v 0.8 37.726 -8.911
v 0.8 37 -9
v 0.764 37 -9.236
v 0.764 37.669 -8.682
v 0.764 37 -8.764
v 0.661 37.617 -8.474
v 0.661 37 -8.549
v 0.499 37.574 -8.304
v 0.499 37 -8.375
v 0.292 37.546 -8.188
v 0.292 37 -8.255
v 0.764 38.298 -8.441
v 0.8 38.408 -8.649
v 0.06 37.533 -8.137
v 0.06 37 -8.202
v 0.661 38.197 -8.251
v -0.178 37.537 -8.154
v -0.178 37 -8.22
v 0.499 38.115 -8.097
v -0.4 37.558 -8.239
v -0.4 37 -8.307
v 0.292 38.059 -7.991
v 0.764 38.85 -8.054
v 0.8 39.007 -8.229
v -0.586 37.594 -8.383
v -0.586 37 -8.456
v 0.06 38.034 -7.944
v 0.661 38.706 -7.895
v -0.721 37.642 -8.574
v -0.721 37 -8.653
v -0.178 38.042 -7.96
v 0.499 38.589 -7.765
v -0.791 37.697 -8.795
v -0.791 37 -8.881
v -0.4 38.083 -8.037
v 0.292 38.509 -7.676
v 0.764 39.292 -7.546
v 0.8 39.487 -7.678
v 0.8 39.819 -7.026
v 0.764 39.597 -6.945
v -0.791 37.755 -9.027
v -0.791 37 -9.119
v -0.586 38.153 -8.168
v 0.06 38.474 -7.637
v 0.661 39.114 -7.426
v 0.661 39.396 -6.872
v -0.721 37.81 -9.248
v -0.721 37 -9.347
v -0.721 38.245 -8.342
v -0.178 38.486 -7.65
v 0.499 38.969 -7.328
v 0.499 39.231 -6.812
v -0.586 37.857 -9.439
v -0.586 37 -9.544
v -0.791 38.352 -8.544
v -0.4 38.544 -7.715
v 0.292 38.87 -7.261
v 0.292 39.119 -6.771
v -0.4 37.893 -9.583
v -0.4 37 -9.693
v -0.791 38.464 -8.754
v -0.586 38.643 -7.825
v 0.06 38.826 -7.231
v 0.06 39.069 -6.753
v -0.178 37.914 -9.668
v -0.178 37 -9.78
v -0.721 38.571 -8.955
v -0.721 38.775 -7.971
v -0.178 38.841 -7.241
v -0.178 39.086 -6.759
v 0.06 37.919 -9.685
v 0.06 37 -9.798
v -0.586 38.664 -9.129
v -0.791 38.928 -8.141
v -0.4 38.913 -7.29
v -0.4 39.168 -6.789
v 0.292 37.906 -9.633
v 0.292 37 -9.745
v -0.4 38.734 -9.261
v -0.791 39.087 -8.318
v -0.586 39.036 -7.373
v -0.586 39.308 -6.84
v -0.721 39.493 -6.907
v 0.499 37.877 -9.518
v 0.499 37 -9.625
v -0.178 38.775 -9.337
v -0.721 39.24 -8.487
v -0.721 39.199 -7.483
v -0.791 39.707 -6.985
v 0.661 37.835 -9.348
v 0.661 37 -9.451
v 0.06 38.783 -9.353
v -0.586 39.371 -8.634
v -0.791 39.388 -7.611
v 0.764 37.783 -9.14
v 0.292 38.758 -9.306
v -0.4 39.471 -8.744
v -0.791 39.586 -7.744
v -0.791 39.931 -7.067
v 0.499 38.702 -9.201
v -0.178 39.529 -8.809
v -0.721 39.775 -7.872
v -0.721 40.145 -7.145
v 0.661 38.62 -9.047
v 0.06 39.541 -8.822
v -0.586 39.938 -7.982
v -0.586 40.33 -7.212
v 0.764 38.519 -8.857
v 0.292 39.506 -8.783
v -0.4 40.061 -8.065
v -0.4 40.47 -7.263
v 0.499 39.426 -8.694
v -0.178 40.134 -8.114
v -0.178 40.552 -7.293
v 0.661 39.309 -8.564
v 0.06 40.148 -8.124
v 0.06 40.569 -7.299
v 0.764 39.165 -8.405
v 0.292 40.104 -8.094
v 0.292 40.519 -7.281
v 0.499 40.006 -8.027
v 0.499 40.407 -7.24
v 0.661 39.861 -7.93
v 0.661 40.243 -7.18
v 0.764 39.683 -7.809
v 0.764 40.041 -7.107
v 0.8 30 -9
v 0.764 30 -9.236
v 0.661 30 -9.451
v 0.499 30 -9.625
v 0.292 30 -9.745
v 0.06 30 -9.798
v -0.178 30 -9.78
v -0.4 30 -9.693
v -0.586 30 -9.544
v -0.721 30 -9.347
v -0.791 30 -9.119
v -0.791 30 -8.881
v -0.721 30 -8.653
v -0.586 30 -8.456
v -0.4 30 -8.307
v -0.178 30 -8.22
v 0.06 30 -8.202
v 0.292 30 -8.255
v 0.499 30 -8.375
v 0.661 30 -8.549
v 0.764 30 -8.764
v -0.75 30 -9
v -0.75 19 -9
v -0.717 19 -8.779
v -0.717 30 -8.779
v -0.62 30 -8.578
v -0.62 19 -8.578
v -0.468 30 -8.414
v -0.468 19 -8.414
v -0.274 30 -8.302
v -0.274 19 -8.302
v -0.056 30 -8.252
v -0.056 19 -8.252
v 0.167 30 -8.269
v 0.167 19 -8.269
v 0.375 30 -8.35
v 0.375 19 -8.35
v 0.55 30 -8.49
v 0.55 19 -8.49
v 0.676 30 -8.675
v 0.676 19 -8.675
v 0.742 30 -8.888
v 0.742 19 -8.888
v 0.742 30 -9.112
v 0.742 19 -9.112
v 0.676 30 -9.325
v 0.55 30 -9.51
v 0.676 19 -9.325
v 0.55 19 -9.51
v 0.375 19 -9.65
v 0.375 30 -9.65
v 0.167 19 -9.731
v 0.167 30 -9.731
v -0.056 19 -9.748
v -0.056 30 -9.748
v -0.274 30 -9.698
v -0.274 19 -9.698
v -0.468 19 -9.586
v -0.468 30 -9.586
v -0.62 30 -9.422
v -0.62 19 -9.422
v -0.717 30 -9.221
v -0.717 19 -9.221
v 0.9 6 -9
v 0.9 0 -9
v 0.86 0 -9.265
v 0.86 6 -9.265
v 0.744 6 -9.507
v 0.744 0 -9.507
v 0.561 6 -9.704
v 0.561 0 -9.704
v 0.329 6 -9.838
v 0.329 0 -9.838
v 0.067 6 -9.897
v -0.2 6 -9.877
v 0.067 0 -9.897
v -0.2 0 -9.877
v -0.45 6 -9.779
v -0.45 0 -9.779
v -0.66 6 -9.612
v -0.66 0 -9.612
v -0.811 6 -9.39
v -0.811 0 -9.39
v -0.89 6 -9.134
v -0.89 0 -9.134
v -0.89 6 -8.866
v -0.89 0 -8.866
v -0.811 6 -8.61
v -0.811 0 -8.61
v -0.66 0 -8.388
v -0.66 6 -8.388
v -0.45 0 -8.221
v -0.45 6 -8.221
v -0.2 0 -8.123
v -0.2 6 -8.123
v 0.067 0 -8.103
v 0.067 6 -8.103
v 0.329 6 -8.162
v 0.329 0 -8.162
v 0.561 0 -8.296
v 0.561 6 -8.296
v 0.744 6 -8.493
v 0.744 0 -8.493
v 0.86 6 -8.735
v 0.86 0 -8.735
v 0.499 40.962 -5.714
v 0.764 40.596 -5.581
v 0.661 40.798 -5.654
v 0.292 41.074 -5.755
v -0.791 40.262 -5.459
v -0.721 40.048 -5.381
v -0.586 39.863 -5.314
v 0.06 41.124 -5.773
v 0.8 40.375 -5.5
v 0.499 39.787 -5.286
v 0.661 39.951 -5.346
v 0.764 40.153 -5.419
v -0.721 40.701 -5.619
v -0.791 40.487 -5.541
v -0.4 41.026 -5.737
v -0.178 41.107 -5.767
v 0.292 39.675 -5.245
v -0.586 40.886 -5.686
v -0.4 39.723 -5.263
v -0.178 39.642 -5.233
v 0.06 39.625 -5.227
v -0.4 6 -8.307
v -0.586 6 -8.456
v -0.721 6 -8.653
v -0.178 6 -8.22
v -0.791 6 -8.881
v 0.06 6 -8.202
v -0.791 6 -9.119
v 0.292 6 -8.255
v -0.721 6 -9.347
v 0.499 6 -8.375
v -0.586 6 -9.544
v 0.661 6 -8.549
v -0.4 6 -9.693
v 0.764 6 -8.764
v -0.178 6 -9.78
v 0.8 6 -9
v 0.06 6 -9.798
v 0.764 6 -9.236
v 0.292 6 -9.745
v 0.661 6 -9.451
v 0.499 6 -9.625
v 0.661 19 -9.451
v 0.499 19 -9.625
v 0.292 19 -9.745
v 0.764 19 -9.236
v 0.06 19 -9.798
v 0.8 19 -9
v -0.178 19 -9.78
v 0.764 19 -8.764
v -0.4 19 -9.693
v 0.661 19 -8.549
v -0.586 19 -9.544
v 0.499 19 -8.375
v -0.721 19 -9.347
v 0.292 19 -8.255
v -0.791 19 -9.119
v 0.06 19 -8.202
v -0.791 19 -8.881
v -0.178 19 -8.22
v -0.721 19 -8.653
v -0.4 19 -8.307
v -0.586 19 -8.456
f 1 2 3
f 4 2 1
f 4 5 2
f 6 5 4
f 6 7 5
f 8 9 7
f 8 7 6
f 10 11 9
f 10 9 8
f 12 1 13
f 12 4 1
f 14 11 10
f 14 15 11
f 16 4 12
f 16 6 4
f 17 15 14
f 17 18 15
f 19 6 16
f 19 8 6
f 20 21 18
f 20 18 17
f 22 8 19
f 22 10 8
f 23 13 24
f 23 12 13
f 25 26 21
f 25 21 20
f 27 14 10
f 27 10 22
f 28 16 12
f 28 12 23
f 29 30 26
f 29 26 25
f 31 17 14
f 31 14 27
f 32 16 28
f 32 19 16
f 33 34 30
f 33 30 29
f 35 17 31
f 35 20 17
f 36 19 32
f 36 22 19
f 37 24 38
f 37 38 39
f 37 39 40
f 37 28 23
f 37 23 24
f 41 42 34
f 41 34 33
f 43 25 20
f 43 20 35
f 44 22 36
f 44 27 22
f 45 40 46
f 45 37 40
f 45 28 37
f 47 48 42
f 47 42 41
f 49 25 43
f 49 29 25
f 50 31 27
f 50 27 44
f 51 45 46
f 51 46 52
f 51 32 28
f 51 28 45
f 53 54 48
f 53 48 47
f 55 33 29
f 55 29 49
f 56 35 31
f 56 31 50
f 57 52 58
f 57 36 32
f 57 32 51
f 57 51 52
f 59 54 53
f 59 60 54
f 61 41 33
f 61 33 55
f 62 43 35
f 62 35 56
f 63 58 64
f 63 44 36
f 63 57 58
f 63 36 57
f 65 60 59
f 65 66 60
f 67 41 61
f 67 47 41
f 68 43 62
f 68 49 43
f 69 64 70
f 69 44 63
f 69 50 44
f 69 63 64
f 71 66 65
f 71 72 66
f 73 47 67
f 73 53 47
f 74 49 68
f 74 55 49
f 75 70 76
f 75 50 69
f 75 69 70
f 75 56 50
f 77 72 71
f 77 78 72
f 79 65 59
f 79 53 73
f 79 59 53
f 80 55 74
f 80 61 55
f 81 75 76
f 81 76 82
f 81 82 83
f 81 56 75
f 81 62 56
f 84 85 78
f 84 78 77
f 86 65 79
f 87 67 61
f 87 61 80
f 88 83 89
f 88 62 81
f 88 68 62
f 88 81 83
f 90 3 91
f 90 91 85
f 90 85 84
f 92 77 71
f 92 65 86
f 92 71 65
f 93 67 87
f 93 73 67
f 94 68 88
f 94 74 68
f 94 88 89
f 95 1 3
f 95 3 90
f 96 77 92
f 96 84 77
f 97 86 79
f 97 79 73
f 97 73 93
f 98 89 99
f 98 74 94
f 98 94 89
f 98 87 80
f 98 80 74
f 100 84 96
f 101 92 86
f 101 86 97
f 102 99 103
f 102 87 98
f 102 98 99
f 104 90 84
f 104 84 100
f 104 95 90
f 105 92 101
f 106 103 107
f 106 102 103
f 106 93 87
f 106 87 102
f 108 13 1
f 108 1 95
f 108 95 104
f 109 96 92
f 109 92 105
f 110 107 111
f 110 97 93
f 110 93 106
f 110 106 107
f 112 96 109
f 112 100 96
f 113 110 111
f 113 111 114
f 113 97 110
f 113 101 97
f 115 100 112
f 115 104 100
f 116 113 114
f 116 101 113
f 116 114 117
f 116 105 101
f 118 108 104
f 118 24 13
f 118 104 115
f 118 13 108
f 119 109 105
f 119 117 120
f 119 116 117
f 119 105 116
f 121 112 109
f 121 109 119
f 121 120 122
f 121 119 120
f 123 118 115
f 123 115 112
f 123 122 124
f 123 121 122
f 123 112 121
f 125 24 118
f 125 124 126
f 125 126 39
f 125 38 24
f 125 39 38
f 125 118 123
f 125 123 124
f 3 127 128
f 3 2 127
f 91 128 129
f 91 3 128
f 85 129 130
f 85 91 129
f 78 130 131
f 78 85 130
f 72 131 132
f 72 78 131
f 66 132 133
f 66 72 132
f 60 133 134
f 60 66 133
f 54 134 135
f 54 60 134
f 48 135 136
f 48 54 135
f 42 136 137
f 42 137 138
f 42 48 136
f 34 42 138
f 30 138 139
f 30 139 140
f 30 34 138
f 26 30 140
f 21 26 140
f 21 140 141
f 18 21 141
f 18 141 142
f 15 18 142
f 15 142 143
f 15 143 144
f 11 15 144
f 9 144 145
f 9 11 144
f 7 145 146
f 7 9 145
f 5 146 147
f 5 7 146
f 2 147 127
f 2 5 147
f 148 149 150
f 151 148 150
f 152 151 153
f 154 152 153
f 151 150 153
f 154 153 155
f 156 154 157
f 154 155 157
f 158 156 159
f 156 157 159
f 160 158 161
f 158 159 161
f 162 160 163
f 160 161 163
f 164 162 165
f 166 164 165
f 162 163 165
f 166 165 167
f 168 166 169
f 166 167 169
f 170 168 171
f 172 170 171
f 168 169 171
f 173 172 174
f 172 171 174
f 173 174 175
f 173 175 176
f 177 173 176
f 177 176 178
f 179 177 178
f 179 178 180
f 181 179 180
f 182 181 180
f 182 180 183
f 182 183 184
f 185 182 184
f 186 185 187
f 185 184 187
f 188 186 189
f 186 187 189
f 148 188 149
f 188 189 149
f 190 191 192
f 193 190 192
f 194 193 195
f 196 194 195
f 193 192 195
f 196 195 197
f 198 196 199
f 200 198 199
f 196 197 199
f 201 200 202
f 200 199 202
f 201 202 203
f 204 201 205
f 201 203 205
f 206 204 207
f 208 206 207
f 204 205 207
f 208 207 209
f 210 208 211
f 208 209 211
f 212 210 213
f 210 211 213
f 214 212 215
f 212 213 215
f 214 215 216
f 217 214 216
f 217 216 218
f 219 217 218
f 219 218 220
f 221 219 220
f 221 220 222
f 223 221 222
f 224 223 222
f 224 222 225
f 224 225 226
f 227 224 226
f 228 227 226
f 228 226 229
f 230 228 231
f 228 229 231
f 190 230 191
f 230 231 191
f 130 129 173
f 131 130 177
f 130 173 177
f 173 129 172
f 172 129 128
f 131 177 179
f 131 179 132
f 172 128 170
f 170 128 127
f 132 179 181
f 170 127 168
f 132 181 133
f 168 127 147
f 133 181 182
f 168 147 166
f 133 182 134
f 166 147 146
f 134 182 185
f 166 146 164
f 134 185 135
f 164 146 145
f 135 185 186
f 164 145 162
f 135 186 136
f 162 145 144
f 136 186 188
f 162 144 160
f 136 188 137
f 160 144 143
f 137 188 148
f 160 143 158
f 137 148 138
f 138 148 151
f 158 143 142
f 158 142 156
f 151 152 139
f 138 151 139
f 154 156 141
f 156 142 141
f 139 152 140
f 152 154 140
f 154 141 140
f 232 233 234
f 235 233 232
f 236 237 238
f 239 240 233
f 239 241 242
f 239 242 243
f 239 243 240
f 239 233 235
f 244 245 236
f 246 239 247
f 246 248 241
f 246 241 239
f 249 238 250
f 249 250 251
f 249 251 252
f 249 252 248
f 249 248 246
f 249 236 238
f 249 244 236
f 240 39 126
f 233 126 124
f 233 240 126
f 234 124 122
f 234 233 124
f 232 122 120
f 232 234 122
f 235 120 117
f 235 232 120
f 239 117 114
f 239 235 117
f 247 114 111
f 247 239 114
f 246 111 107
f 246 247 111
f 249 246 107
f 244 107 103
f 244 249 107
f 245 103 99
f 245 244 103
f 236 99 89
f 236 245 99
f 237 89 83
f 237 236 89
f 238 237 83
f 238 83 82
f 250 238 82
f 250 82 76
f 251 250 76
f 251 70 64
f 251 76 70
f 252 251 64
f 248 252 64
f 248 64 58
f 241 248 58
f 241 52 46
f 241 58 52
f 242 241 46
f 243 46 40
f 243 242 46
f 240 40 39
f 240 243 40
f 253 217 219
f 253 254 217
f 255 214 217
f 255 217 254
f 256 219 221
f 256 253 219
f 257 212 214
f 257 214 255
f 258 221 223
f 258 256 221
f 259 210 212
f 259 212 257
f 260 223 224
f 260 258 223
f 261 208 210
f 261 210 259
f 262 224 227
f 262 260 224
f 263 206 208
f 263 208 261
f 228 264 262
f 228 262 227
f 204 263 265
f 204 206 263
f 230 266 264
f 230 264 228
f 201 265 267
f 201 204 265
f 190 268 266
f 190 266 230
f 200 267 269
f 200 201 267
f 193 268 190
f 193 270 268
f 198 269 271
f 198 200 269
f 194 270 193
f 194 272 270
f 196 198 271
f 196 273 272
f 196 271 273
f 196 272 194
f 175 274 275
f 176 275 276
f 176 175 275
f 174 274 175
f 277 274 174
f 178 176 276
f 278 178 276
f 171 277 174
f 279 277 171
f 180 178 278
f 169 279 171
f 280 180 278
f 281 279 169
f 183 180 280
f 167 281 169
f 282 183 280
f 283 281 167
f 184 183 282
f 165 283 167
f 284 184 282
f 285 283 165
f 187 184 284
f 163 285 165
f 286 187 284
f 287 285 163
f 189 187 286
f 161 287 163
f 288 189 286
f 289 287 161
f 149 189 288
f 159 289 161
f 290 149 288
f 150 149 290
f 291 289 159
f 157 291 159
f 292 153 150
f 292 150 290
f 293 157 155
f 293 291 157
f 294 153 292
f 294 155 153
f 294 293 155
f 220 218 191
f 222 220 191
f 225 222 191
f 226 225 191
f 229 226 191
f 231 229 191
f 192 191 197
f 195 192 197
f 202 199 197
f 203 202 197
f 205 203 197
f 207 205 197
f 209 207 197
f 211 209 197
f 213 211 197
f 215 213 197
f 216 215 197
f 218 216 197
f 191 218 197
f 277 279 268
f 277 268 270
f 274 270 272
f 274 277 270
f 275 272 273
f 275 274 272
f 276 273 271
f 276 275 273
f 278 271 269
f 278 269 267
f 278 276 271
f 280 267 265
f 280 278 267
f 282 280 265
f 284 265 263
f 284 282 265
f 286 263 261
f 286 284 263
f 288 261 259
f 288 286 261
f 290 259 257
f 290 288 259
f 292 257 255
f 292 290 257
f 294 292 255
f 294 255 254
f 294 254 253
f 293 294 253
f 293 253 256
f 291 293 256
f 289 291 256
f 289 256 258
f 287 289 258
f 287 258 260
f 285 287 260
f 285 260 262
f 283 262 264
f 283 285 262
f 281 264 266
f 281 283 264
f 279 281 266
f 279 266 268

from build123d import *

# Parameters (mm, degrees)
SKETCH2_R         = 0.8
SKETCH4_R         = 0.9
EXTRUDE1_DEPTH    = 6
SKETCH5_OUTSIDE_W = 12.086
SKETCH5_OUTSIDE_H = 14.96
SKETCH5_OUTSIDE_R = 0.75
EXTRUDE3_DEPTH    = 11


with BuildPart() as part:
    # Sweep1: sweep along a path in Sketch1
    with BuildLine(Plane(origin=(0, 0, 0), x_dir=(0, 0, -1), z_dir=(1, 0, 0))) as sweep1_path:
        Line((9, 0), (9, 37))
        ThreePointArc((9, 37), (8.457456133, 38.720729309), (7.02606043, 39.819077862))
        Line((7.02606043, 39.819077862), (5.5, 40.374518435))
    # Sketch2 → Sweep1 (sweep)
    with BuildSketch(Plane(origin=(0, 0, 0), x_dir=(1, 0, 0), z_dir=(0, 1, 0))):
        with Locations((0, 9)):
            Circle(SKETCH2_R)
    sweep(path=sweep1_path.line)

    # Sketch4 → Extrude1 (add)
    with BuildSketch(Plane(origin=(0, 0, 0), x_dir=(1, 0, 0), z_dir=(0, 1, 0))):
        with Locations((0, 9)):
            Circle(SKETCH4_R)
    extrude(amount=EXTRUDE1_DEPTH)

    # Sketch5 outside → Extrude3 (cut)
    with BuildSketch(Plane(origin=(0, 19, 0), x_dir=(-1, 0, 0), z_dir=(0, 1, 0))):
        with Locations((0, -7.563)):
            Rectangle(SKETCH5_OUTSIDE_W, SKETCH5_OUTSIDE_H)
        with Locations((0, -9)):
            Circle(SKETCH5_OUTSIDE_R, mode=Mode.SUBTRACT)
    extrude(amount=EXTRUDE3_DEPTH, mode=Mode.SUBTRACT)


solid = part.part
